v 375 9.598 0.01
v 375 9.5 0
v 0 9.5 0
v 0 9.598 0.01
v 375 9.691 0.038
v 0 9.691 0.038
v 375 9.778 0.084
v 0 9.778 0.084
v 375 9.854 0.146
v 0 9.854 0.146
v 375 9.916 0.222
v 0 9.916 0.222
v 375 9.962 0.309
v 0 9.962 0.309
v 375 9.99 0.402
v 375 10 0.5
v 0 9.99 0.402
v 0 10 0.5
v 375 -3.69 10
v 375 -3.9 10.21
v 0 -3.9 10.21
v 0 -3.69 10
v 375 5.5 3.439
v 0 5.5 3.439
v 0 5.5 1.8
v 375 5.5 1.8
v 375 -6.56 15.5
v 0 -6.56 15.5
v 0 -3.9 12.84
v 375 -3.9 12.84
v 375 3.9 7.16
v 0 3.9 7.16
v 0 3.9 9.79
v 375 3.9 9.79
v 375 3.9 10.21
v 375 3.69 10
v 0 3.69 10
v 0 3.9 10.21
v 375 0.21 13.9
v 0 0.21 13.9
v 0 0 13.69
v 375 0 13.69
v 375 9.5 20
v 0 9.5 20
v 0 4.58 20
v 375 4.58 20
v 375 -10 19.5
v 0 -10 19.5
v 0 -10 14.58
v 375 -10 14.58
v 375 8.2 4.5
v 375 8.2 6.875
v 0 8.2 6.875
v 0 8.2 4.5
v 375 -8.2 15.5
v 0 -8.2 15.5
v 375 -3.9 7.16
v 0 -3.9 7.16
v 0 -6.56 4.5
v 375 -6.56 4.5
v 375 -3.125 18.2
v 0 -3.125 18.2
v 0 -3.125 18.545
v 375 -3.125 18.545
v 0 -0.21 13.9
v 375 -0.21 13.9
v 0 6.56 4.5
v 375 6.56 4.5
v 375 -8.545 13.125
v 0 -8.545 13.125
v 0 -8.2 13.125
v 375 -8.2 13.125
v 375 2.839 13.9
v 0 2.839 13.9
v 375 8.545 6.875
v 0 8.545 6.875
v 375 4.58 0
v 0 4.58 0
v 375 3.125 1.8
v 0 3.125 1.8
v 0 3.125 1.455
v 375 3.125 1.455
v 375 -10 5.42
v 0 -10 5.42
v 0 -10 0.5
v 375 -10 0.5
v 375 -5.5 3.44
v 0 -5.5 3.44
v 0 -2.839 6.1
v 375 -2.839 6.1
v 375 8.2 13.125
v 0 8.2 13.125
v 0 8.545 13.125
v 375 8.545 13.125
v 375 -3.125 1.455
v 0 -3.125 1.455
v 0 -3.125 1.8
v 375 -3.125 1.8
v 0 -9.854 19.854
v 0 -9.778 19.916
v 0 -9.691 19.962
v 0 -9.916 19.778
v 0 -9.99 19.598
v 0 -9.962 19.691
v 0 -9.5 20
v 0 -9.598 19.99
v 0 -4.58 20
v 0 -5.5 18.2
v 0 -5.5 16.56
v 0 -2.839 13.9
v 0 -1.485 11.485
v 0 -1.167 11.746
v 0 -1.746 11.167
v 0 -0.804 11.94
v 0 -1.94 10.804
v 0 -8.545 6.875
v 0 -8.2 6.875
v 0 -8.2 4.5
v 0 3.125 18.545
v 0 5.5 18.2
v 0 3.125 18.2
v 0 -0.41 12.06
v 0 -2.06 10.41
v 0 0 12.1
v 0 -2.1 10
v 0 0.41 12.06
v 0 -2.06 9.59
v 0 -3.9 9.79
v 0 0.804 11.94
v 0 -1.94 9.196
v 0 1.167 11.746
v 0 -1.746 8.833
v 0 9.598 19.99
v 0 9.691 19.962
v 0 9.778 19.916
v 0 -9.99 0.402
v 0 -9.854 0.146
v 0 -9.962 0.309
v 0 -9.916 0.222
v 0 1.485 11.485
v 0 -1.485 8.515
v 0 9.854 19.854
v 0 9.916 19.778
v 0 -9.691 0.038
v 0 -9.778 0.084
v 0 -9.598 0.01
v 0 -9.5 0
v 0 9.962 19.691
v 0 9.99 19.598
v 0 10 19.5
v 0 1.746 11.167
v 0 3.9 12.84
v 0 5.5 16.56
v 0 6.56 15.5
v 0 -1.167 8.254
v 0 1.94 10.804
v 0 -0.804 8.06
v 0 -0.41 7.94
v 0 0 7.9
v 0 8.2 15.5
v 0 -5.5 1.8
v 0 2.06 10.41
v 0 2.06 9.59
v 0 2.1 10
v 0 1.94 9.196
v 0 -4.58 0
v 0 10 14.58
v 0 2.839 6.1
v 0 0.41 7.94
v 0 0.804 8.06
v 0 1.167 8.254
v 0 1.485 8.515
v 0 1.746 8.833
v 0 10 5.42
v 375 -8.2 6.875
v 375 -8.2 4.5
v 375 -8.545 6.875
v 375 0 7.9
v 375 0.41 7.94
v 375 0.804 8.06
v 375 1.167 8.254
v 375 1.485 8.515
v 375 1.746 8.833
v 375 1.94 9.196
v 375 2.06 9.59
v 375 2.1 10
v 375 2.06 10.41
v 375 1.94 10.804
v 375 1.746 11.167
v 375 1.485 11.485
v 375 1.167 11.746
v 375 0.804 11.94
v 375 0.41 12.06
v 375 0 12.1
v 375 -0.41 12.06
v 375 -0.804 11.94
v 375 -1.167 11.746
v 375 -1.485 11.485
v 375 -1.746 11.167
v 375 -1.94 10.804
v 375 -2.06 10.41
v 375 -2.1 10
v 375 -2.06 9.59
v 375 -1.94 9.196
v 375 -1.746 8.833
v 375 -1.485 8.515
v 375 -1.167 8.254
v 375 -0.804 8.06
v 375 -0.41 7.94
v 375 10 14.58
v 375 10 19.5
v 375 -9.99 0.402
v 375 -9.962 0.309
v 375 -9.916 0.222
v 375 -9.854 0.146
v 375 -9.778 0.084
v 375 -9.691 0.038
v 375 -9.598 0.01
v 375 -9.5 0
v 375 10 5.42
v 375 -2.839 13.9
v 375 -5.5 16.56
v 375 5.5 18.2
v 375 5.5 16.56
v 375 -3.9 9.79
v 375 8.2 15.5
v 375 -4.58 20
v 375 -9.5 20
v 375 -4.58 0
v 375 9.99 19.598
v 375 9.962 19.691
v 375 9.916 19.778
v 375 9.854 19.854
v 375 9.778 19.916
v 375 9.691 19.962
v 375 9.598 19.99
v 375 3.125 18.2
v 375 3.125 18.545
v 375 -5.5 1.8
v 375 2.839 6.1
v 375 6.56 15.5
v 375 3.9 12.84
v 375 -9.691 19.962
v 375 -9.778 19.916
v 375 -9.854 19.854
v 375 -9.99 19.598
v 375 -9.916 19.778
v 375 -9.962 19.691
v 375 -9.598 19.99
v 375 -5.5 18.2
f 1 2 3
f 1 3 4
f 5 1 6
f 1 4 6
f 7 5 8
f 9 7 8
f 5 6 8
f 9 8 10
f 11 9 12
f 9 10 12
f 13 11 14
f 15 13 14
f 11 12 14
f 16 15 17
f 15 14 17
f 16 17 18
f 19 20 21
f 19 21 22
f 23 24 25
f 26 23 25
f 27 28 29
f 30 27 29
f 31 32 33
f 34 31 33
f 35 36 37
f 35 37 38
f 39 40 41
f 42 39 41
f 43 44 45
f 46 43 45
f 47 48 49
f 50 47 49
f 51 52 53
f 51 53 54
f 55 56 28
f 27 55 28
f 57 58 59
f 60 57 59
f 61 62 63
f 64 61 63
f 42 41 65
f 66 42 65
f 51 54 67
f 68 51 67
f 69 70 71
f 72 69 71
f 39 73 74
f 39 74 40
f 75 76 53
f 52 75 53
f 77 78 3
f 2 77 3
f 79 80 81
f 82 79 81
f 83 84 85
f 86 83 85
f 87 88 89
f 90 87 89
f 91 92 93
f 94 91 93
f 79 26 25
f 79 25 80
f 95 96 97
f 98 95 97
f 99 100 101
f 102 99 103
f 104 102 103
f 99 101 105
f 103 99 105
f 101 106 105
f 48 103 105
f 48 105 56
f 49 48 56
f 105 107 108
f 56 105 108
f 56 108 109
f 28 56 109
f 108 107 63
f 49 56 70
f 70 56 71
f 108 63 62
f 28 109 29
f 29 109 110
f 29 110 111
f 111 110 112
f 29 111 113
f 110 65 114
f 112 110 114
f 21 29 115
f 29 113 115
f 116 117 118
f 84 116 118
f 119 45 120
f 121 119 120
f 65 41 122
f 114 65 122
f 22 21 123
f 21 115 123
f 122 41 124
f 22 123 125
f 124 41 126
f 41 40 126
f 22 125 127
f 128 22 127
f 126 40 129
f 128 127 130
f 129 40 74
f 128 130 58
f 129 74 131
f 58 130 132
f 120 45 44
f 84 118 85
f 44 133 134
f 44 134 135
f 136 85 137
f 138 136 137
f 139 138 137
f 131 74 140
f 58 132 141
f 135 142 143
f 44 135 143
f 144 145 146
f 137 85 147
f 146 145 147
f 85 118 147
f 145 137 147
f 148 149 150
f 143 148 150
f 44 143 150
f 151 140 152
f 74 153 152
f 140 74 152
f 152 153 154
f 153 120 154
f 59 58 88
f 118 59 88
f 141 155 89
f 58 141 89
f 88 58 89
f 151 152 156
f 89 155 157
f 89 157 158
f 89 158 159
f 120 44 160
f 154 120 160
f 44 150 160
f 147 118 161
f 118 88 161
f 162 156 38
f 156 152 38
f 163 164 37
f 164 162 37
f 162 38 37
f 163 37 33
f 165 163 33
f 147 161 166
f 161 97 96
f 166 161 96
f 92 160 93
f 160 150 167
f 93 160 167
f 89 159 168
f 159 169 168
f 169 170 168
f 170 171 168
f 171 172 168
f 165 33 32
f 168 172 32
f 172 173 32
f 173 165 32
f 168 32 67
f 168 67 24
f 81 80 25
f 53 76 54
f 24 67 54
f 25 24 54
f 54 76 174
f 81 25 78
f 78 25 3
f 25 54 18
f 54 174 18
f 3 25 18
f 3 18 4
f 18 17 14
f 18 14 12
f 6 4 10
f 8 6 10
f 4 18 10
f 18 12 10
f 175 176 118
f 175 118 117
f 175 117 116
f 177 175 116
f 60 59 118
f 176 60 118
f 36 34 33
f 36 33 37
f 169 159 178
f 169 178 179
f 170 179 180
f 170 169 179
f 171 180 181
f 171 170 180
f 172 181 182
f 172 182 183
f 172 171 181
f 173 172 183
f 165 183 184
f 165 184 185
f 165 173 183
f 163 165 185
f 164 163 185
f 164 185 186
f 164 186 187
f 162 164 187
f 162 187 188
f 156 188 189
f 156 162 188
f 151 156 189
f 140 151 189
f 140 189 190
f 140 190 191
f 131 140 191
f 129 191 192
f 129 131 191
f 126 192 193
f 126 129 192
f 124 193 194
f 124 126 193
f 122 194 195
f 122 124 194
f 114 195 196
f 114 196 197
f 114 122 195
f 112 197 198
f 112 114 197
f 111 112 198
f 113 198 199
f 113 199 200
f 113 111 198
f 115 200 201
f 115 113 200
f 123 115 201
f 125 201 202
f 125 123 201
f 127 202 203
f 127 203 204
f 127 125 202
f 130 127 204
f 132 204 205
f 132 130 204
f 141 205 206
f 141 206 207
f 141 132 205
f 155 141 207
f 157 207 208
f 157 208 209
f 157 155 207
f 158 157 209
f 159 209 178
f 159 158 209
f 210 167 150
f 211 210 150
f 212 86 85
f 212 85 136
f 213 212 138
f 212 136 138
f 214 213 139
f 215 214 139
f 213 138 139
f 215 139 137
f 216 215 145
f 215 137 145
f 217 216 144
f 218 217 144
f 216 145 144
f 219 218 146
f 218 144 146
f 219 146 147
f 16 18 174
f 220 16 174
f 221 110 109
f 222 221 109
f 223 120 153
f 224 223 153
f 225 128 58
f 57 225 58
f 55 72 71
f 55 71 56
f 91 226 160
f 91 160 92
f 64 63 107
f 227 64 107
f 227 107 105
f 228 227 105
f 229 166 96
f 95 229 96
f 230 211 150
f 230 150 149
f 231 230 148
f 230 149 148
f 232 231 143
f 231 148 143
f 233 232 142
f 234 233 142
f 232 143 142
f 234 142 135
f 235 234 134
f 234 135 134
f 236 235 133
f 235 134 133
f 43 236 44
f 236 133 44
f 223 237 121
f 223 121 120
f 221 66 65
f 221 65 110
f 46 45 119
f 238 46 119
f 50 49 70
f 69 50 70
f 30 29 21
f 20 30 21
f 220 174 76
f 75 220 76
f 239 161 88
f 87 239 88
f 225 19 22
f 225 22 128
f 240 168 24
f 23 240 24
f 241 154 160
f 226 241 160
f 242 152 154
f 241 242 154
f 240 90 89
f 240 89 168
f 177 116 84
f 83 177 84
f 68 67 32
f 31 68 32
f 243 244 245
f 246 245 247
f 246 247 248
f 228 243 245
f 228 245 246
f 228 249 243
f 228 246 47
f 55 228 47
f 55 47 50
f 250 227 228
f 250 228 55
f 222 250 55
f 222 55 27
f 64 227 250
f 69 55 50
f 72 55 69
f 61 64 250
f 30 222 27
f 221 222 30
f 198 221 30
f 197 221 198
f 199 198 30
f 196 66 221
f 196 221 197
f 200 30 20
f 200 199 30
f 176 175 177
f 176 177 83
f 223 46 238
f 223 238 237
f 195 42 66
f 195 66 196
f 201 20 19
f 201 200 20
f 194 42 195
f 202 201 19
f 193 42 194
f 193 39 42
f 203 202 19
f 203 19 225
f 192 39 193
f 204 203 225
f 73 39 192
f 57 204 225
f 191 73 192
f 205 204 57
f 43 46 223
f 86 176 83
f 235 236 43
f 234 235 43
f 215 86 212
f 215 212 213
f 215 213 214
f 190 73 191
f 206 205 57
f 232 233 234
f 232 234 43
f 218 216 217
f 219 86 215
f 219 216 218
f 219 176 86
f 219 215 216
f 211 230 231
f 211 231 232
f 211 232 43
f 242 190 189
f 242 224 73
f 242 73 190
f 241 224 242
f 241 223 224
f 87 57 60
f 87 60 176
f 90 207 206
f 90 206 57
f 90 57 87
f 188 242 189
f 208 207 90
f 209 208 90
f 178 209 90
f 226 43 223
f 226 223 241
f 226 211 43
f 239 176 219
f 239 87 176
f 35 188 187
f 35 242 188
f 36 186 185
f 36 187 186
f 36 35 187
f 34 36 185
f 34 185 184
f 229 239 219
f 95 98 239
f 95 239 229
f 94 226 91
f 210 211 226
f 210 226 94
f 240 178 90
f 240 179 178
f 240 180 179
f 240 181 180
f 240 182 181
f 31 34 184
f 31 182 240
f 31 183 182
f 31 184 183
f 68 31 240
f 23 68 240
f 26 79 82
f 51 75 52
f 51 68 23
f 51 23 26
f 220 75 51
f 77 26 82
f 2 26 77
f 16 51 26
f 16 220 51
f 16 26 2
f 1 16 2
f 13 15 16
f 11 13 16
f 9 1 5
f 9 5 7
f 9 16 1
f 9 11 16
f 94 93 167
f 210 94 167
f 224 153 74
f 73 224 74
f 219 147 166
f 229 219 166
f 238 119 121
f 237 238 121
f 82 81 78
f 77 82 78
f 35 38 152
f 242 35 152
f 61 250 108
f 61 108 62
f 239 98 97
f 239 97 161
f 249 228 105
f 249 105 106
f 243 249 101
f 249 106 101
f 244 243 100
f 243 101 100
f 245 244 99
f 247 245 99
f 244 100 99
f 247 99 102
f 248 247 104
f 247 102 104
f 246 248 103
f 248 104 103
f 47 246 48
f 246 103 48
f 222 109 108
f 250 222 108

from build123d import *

# Parameters (mm, degrees)
PROFILE_SKETCH_R      = 2.1
PROFILE_EXTRUDE_DEPTH = 375


with BuildPart() as part:
    # Profile Sketch → Profile Extrude (new body)
    with BuildSketch(Plane(origin=(0, 0, 0), x_dir=(0, 0, -1), z_dir=(1, 0, 0))):
        with BuildLine():
            ThreePointArc((0, 9.5), (-0.146446609, 9.853553391), (-0.5, 10))
            Line((-0.5, 10), (-5.42, 10))
            Line((-5.42, 10), (-6.875, 8.545))
            Line((-6.875, 8.545), (-6.875, 8.2))
            Line((-6.875, 8.2), (-4.5, 8.2))
            Line((-4.5, 8.2), (-4.5, 6.56))
            Line((-4.5, 6.56), (-7.16, 3.9))
            Line((-7.16, 3.9), (-9.79, 3.9))
            Line((-9.79, 3.9), (-10, 3.69))
            Line((-10, 3.69), (-10.21, 3.9))
            Line((-10.21, 3.9), (-12.84, 3.9))
            Line((-12.84, 3.9), (-15.5, 6.56))
            Line((-15.5, 6.56), (-15.5, 8.2))
            Line((-15.5, 8.2), (-13.125, 8.2))
            Line((-13.125, 8.2), (-13.125, 8.545))
            Line((-13.125, 8.545), (-14.58, 10))
            Line((-14.58, 10), (-19.5, 10))
            ThreePointArc((-19.5, 10), (-19.853553391, 9.853553391), (-20, 9.5))
            Line((-20, 9.5), (-20, 4.58))
            Line((-20, 4.58), (-18.545, 3.125))
            Line((-18.545, 3.125), (-18.2, 3.125))
            Line((-18.2, 3.125), (-18.2, 5.5))
            Line((-18.2, 5.5), (-16.56, 5.5))
            Line((-16.56, 5.5), (-13.9, 2.838679656))
            Line((-13.9, 2.838679656), (-13.9, 0.21))
            Line((-13.9, 0.21), (-13.69, 0))
            Line((-13.69, 0), (-13.9, -0.21))
            Line((-13.9, -0.21), (-13.9, -2.838679656))
            Line((-13.9, -2.838679656), (-16.56, -5.5))
            Line((-16.56, -5.5), (-18.2, -5.5))
            Line((-18.2, -5.5), (-18.2, -3.125))
            Line((-18.2, -3.125), (-18.545, -3.125))
            Line((-18.545, -3.125), (-20, -4.58))
            Line((-20, -4.58), (-20, -9.5))
            ThreePointArc((-20, -9.5), (-19.853553391, -9.853553391), (-19.5, -10))
            Line((-19.5, -10), (-14.58, -10))
            Line((-14.58, -10), (-13.125, -8.545))
            Line((-13.125, -8.545), (-13.125, -8.2))
            Line((-13.125, -8.2), (-15.5, -8.2))
            Line((-15.5, -8.2), (-15.5, -6.56))
            Line((-15.5, -6.56), (-12.84, -3.9))
            Line((-12.84, -3.9), (-10.21, -3.9))
            Line((-10.21, -3.9), (-10, -3.69))
            Line((-10, -3.69), (-9.79, -3.9))
            Line((-9.79, -3.9), (-7.16, -3.9))
            Line((-7.16, -3.9), (-4.5, -6.56))
            Line((-4.5, -6.56), (-4.5, -8.2))
            Line((-4.5, -8.2), (-6.875, -8.2))
            Line((-6.875, -8.2), (-6.875, -8.545))
            Line((-6.875, -8.545), (-5.42, -10))
            Line((-5.42, -10), (-0.5, -10))
            ThreePointArc((-0.5, -10), (-0.146446609, -9.853553391), (0, -9.5))
            Line((0, -9.5), (0, -4.58))
            Line((0, -4.58), (-1.455, -3.125))
            Line((-1.455, -3.125), (-1.8, -3.125))
            Line((-1.8, -3.125), (-1.8, -5.5))
            Line((-1.8, -5.5), (-3.44, -5.5))
            Line((-3.44, -5.5), (-6.1, -2.838679656))
            Line((-6.1, -2.838679656), (-6.1, -0.21))
            Line((-6.1, -0.21), (-6.1, 2.838679656))
            Line((-6.1, 2.838679656), (-3.438679656, 5.5))
            Line((-3.438679656, 5.5), (-1.8, 5.5))
            Line((-1.8, 5.5), (-1.8, 3.125))
            Line((-1.8, 3.125), (-1.455, 3.125))
            Line((-1.455, 3.125), (0, 4.58))
            Line((0, 4.58), (0, 9.5))
        make_face()
        with Locations((-10, 0)):
            Circle(PROFILE_SKETCH_R, mode=Mode.SUBTRACT)
    extrude(amount=PROFILE_EXTRUDE_DEPTH)


solid = part.part
